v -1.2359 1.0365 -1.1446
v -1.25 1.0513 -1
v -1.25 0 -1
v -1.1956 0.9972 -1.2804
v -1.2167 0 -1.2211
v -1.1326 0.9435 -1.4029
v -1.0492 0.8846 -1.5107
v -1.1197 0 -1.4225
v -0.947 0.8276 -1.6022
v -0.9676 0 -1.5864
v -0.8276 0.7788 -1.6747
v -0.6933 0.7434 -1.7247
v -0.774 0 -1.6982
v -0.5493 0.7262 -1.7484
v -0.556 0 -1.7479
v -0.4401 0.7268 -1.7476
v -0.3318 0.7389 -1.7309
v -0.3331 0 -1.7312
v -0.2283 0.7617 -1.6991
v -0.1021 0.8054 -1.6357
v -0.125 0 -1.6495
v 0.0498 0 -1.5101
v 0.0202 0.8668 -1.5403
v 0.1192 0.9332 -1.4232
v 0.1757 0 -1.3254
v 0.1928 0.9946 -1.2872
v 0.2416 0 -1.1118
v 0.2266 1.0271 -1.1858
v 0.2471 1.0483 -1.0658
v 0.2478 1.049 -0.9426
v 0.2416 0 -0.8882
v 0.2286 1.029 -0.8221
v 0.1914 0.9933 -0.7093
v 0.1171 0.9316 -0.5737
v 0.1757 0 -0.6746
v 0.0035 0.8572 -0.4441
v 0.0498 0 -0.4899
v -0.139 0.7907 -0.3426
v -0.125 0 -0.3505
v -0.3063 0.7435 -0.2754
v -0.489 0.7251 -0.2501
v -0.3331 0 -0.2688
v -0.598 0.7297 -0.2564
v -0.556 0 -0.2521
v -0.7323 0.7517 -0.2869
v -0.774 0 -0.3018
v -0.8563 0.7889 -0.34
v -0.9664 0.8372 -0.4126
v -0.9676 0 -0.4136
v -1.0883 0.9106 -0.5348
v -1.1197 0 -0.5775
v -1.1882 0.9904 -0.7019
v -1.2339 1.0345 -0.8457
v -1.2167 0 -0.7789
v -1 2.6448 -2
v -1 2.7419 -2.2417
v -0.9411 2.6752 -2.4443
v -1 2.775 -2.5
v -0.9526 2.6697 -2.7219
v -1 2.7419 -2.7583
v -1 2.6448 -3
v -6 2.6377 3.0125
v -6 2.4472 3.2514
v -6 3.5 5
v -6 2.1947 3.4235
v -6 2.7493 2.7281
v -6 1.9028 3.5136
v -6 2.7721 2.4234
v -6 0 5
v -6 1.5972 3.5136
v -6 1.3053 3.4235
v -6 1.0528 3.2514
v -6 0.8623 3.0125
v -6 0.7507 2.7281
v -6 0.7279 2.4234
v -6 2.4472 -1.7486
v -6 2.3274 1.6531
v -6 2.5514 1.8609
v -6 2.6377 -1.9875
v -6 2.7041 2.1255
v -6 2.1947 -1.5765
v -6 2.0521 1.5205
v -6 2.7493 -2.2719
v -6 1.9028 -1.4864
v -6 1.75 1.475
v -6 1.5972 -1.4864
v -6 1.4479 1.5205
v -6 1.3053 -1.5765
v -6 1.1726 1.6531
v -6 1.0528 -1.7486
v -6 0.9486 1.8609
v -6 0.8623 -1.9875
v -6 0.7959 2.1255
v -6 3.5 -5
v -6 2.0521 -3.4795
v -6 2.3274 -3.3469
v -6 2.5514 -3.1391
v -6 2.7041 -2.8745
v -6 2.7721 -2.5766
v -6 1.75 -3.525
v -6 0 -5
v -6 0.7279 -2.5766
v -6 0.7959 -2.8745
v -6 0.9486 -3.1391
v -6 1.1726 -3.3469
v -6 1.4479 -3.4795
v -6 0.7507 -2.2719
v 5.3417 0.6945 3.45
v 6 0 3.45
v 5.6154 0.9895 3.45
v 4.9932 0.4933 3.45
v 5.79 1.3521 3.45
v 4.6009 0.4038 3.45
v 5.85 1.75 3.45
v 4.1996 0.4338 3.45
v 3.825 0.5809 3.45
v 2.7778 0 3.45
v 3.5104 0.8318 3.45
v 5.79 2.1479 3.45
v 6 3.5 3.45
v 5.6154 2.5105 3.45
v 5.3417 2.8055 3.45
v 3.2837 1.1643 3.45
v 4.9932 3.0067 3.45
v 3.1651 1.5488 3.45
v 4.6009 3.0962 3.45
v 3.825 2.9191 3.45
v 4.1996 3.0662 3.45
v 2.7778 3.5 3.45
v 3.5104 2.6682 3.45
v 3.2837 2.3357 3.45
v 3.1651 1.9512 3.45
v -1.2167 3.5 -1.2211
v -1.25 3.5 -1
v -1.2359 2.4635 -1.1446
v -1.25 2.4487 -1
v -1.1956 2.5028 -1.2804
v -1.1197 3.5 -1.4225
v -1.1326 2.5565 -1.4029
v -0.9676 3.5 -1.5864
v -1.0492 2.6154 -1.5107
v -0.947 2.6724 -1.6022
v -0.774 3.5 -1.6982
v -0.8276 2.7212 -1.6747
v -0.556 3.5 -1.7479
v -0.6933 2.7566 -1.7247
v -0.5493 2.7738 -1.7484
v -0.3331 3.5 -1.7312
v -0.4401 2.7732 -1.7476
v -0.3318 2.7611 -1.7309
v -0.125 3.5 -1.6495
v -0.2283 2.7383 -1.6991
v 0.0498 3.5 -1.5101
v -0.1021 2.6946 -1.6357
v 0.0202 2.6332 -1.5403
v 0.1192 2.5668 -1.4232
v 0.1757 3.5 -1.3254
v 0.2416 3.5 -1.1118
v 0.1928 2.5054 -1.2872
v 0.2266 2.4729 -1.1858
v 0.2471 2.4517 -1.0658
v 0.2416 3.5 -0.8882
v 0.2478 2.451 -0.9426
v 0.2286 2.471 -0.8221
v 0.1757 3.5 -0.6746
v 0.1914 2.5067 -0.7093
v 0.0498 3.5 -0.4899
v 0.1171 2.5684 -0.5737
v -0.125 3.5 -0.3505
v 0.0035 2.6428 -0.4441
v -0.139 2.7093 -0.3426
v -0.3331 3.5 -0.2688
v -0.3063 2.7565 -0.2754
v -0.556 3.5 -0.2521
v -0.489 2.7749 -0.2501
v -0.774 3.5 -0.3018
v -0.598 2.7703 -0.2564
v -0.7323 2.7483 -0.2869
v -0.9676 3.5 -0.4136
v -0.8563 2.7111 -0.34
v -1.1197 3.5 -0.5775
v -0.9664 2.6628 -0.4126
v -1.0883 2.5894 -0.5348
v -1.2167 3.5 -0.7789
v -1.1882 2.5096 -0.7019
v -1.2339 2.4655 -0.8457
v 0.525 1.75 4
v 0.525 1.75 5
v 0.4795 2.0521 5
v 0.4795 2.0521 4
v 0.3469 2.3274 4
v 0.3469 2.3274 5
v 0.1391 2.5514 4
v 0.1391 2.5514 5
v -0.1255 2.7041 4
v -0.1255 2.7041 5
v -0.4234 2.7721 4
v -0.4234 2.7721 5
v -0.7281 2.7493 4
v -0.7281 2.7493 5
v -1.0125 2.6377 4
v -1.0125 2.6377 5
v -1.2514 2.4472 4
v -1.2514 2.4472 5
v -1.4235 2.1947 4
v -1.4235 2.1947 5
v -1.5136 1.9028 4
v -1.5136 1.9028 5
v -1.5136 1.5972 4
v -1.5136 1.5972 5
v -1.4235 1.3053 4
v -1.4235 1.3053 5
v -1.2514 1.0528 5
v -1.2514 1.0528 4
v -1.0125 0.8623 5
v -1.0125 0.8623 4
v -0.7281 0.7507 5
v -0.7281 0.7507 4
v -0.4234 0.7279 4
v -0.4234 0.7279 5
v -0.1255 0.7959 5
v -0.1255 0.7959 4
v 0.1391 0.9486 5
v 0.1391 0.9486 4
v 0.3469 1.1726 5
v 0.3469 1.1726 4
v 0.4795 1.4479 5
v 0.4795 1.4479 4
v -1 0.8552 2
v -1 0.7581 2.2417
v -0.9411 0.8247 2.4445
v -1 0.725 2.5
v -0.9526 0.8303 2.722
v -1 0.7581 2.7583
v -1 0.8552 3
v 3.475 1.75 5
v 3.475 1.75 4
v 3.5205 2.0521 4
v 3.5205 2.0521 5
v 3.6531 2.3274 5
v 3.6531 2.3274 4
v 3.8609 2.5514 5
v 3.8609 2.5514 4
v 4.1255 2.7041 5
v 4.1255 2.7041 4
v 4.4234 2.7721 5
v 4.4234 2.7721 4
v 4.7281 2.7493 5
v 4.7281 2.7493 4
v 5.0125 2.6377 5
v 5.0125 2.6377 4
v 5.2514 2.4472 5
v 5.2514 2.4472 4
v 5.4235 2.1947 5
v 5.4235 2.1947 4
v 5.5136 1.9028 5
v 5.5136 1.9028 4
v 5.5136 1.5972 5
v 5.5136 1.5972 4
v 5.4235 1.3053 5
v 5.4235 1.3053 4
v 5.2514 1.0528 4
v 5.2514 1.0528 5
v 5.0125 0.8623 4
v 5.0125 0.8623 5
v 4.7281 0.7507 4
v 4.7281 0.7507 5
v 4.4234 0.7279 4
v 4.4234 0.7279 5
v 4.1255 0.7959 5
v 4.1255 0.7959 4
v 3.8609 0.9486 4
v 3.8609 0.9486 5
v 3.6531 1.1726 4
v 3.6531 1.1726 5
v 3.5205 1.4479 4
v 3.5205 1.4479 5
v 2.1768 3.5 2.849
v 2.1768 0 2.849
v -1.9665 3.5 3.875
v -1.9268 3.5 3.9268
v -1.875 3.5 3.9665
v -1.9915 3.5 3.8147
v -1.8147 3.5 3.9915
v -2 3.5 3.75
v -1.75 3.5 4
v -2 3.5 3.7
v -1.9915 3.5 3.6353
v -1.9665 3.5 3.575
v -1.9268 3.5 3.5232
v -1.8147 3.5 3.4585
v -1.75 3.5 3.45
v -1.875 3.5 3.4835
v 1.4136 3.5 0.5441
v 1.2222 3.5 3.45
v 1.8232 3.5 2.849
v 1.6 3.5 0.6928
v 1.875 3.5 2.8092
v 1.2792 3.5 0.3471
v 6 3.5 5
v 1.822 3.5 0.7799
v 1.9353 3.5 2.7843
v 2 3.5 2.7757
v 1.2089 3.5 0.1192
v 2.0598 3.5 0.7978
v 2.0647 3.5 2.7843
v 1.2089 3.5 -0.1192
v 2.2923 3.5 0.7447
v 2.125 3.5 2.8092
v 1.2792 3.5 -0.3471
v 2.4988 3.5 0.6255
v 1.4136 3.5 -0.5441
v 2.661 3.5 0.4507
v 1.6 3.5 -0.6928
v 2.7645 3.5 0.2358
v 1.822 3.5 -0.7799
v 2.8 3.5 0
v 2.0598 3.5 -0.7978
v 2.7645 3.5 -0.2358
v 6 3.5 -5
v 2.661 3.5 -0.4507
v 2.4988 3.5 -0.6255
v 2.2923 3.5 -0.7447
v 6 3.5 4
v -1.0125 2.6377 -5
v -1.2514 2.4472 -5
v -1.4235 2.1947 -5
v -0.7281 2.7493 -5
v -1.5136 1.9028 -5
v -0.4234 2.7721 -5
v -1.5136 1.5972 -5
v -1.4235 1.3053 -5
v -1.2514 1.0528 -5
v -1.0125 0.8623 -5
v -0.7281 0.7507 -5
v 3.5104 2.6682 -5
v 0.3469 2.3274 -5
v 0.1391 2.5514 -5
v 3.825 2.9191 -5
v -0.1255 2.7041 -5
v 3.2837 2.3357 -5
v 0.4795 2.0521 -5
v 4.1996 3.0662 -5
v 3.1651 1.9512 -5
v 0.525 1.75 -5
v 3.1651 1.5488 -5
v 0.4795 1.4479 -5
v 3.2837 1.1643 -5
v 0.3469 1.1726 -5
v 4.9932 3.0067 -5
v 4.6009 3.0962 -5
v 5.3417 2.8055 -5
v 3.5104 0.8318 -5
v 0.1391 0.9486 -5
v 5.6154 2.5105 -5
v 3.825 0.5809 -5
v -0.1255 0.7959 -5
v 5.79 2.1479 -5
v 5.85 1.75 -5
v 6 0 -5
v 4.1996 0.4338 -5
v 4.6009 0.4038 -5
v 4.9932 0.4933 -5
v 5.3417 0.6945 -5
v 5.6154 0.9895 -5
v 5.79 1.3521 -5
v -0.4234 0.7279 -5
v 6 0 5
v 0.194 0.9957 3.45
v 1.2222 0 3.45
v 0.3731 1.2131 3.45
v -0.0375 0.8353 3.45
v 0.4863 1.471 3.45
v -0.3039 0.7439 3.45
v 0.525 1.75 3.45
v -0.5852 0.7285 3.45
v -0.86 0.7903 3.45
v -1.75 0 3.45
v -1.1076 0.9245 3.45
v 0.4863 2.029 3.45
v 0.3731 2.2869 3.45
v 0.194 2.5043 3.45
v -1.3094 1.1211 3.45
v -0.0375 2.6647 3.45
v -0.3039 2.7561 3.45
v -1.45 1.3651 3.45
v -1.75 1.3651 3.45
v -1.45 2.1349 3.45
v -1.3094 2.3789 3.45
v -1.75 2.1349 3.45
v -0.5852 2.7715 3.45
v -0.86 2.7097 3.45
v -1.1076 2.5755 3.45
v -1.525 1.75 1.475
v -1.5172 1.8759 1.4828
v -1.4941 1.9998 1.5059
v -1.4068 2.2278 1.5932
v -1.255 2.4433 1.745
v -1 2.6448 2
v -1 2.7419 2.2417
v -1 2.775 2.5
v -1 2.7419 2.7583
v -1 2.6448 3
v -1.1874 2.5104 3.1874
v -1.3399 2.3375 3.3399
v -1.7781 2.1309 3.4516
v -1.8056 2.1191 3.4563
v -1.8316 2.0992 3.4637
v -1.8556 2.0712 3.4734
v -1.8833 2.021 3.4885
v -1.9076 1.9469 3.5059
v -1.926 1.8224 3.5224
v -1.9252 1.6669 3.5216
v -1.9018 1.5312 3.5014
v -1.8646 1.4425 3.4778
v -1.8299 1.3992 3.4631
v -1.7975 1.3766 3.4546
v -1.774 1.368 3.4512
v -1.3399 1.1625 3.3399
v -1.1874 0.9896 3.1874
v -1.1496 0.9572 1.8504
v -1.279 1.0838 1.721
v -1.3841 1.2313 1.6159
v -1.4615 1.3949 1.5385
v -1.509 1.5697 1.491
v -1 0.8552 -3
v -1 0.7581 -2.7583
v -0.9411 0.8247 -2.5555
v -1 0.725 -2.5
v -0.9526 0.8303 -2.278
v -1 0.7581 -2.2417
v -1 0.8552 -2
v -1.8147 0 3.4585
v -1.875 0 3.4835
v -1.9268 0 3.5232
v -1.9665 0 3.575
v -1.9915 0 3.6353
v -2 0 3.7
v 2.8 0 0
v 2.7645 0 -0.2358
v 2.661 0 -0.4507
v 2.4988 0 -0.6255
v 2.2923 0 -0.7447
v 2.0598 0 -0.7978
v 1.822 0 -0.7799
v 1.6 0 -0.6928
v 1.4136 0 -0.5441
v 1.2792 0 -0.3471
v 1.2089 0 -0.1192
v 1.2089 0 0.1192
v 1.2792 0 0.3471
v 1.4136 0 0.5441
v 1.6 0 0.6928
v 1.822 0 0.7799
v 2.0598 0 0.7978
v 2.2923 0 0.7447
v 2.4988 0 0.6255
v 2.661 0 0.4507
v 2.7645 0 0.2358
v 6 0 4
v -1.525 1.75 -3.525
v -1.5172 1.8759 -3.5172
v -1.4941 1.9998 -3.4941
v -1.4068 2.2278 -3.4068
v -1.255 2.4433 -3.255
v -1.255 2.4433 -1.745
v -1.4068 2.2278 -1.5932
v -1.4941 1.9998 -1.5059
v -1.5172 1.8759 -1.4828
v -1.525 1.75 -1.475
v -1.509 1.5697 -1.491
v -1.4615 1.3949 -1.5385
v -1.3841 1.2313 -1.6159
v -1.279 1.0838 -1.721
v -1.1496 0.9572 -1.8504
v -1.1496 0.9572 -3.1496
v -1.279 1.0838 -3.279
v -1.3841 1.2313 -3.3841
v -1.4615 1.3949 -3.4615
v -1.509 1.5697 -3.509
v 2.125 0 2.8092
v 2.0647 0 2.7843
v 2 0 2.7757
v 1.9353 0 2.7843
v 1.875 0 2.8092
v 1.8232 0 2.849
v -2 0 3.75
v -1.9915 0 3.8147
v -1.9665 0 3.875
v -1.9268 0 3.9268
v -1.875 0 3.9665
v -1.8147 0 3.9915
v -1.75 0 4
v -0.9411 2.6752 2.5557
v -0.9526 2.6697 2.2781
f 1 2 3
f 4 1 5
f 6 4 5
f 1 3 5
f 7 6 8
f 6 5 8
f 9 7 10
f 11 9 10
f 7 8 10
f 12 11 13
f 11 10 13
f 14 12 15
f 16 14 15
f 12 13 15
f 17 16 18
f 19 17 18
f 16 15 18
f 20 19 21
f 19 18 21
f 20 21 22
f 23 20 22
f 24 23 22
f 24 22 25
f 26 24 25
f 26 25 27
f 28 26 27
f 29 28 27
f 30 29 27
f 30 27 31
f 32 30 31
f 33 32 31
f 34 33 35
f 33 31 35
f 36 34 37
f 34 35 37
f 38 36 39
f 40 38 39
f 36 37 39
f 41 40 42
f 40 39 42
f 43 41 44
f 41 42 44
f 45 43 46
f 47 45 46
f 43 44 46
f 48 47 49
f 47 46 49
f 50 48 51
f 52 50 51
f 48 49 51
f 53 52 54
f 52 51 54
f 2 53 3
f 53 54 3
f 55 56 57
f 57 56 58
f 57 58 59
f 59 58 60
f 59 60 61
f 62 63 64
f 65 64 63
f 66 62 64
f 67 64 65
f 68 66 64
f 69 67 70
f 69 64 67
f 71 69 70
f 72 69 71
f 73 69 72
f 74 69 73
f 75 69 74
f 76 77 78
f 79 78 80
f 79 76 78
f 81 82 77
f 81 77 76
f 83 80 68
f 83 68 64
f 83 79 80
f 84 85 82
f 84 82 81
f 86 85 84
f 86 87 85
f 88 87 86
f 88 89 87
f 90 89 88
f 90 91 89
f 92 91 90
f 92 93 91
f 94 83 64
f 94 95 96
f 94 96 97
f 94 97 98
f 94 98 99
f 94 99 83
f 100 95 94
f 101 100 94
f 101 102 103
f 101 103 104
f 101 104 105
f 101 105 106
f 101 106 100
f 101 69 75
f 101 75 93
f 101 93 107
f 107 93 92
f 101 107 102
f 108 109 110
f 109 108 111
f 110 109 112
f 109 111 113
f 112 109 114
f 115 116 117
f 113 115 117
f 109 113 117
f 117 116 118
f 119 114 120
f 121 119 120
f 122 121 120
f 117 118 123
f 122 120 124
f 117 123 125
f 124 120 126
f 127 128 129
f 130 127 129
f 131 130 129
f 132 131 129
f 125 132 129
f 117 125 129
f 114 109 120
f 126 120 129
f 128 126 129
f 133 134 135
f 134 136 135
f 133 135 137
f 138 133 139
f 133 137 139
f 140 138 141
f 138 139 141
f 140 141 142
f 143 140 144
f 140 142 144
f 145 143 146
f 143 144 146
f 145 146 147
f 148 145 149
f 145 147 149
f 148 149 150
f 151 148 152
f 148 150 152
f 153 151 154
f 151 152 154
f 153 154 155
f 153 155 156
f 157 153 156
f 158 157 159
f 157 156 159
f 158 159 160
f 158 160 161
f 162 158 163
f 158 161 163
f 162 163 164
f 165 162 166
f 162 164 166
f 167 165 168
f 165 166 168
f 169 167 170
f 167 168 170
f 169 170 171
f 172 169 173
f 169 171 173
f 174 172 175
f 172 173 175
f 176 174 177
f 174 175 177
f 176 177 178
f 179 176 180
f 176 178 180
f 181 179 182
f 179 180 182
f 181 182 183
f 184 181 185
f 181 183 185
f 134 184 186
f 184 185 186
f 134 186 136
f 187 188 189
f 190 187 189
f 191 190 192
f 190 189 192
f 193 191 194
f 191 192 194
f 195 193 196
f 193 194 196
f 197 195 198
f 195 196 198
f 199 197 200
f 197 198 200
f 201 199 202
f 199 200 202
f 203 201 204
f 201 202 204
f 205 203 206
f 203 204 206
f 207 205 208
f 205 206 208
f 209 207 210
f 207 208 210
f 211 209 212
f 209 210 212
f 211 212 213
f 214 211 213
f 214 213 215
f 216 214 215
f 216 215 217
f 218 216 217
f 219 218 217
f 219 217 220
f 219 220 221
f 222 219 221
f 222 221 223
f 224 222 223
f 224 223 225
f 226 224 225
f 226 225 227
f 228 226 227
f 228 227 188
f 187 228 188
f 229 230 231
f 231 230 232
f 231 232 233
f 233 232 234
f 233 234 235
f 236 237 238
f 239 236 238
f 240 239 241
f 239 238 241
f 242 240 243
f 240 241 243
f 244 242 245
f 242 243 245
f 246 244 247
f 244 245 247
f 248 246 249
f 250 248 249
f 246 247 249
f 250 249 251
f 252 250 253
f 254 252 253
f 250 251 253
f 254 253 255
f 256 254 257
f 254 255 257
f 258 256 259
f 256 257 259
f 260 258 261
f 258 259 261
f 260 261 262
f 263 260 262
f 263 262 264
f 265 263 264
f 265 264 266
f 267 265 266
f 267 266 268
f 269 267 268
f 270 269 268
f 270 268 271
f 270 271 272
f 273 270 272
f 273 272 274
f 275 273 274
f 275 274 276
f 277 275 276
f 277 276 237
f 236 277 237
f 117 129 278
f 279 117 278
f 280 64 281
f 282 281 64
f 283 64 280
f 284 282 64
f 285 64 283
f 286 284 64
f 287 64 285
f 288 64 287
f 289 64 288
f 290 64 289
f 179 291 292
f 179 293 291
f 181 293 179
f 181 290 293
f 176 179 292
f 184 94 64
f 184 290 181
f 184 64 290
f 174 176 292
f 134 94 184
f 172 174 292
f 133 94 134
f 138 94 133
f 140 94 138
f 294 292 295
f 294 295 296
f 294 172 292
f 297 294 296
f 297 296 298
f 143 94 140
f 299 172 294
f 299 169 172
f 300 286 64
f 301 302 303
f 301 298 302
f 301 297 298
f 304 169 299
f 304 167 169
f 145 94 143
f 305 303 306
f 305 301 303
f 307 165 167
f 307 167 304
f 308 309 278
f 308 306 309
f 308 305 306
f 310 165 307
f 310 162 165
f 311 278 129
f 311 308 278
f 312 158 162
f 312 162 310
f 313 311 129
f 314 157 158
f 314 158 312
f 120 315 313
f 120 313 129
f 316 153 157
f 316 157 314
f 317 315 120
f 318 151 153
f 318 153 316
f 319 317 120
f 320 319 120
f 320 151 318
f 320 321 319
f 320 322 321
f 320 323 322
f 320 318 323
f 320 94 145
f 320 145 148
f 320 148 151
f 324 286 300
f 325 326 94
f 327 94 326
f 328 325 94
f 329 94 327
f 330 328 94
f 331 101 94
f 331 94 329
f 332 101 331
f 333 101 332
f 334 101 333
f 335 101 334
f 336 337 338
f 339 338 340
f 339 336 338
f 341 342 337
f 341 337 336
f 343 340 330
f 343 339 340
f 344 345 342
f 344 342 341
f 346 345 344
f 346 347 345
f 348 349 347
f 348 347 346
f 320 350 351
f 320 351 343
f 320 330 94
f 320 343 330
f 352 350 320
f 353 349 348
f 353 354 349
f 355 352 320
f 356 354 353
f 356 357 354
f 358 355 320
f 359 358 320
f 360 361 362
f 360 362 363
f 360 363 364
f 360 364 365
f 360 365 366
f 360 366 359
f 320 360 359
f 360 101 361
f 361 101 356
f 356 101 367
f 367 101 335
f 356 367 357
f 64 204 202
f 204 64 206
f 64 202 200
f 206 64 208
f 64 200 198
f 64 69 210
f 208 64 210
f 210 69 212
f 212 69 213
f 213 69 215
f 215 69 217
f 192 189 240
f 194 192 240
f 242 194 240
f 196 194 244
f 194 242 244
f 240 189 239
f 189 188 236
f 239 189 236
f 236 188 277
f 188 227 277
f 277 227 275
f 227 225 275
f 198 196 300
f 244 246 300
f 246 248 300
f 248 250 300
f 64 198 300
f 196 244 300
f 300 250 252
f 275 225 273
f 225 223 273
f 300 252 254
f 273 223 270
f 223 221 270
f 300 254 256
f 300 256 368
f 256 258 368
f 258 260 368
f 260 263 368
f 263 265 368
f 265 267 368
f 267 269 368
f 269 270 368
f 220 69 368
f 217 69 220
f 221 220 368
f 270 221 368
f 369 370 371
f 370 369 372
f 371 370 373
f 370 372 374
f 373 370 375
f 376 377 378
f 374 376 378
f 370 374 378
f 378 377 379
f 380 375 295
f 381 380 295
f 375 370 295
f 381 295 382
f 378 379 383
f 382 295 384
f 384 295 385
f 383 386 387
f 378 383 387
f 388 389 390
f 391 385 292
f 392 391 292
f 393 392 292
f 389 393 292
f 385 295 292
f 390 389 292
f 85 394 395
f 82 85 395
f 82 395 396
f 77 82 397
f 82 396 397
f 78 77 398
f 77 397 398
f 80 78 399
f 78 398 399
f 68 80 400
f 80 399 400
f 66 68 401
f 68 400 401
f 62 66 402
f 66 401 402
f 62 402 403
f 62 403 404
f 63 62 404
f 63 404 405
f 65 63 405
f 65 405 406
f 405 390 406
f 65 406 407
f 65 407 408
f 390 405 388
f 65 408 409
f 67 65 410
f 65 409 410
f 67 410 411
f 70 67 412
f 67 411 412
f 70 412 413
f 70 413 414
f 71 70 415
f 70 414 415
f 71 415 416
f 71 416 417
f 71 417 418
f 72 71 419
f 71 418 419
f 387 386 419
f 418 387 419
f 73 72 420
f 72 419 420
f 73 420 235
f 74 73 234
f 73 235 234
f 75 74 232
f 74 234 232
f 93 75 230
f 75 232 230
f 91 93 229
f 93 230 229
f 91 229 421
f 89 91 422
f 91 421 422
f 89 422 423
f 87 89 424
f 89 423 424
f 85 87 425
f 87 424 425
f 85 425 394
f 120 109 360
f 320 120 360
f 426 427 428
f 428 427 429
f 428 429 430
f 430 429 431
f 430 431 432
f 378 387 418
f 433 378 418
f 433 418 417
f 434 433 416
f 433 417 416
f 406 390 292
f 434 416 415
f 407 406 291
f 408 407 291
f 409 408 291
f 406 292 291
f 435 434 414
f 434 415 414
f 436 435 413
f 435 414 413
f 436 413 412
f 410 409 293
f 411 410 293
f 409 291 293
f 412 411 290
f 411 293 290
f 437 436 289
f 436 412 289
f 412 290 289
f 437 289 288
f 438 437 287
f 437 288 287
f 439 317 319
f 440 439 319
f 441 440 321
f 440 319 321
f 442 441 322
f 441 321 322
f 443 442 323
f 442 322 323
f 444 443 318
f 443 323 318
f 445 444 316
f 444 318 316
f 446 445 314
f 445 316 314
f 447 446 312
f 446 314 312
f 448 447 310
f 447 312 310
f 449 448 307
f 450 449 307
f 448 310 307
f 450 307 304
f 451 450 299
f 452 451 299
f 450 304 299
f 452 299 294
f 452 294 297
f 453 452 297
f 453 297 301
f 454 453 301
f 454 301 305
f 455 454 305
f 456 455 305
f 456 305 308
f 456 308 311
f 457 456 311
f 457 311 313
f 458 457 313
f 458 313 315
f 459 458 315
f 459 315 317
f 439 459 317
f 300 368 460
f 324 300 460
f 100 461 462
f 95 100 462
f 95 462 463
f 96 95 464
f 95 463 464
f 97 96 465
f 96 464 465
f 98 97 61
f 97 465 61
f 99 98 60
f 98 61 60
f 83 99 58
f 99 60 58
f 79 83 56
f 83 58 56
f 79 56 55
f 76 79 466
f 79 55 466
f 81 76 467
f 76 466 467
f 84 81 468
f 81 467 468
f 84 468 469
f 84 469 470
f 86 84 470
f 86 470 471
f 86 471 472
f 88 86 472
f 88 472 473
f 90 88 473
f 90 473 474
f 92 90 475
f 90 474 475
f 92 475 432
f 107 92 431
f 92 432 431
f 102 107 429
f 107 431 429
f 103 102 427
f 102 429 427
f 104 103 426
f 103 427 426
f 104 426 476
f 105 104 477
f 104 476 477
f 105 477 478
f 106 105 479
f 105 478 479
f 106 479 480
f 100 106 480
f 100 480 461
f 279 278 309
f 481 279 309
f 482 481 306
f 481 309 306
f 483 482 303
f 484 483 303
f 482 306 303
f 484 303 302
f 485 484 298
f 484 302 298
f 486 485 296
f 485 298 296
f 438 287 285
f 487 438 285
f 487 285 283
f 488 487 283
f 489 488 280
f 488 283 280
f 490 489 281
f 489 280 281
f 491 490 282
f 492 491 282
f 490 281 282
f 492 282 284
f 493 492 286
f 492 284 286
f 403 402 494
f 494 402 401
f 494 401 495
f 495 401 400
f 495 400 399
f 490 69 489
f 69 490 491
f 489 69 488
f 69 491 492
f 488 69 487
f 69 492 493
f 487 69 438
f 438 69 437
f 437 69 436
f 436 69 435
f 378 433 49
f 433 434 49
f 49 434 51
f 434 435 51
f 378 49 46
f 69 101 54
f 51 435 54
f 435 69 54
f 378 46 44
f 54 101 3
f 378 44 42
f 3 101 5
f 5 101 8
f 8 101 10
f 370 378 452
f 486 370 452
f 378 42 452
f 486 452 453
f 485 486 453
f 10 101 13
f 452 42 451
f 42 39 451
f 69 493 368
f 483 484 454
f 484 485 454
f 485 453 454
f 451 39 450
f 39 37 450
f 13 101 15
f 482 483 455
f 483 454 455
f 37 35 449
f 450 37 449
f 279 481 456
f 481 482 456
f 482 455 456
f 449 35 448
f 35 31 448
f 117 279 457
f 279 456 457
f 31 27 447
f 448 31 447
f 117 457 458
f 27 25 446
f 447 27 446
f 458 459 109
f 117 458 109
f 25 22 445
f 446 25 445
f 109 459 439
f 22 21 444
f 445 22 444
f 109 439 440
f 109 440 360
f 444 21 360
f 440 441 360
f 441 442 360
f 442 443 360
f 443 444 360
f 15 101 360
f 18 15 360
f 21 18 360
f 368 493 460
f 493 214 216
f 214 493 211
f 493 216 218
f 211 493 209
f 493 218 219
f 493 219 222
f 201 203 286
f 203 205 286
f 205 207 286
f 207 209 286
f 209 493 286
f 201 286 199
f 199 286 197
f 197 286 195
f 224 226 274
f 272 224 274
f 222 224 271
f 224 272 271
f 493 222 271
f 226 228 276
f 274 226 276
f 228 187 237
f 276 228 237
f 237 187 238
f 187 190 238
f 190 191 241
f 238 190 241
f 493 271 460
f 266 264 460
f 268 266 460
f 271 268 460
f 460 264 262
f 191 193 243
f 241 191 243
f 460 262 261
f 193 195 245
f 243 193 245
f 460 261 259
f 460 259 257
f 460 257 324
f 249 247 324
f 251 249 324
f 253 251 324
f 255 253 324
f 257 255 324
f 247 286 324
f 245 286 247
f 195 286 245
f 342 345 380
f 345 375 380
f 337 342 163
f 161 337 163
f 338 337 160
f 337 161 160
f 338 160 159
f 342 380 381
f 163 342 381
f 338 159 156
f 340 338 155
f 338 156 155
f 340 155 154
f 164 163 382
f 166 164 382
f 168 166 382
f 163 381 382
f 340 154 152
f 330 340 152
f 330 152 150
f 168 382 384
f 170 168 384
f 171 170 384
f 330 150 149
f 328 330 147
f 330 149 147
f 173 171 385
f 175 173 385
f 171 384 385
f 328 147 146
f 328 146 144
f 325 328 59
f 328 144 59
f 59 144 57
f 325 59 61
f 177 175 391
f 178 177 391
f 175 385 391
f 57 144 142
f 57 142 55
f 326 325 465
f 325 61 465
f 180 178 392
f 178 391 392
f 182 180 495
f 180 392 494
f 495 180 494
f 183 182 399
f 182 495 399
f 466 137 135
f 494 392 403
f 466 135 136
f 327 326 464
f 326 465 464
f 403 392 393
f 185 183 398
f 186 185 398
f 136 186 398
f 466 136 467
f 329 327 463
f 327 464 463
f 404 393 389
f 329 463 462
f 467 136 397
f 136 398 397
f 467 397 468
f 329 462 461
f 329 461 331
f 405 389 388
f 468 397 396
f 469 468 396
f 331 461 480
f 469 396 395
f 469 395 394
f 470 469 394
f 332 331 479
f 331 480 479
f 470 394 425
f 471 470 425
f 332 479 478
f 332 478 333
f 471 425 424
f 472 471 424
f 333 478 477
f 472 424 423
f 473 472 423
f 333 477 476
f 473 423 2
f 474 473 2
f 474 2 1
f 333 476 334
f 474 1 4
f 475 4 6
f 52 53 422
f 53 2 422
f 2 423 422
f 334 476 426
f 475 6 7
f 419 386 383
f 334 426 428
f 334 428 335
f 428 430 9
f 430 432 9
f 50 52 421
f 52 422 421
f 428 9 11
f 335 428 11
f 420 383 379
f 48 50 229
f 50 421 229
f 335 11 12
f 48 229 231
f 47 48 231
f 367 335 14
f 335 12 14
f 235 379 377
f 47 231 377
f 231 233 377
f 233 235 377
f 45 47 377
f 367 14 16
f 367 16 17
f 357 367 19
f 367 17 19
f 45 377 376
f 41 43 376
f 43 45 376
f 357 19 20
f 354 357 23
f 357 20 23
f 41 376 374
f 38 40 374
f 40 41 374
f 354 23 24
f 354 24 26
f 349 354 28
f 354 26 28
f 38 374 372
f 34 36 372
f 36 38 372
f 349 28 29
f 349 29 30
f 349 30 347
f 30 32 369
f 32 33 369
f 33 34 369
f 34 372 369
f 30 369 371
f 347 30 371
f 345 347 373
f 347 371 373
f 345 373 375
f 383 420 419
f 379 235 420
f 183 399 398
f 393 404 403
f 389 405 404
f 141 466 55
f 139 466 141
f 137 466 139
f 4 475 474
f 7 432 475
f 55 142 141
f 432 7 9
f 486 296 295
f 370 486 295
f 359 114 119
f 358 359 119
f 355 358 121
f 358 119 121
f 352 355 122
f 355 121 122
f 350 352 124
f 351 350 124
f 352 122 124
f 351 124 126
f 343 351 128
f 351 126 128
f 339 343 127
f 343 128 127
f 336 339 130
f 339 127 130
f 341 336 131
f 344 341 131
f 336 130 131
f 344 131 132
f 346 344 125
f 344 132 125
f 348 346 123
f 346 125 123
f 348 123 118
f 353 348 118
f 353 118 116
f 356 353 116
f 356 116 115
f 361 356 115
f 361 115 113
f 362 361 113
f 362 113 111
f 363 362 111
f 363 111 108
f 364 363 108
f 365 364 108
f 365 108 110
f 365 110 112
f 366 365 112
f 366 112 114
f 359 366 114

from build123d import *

# Parameters (mm, degrees)
SKETCH1_W                      = 12
SKETCH1_H                      = 10
BOSS_EXTRUDE1_DEPTH            = 3.5
CUT_EXTRUDE1_DEPTH             = 3.5
M2_5_CLEARANCE_HOLE1_D         = 2.7
M2_5_CLEARANCE_HOLE1_DEPTH     = 8.45
M2_5_TAPPED_HOLE1_D            = 2.05
M2_5_TAPPED_HOLE1_DEPTH        = 1
F_1_5_1_5_DIAMETER_HOLE1_D     = 1.5
F_1_5_1_5_DIAMETER_HOLE1_DEPTH = 3.5
M2_5_TAPPED_HOLE2_D            = 2.05
M2_5_TAPPED_HOLE4_D            = 2.05
M2_5_TAPPED_HOLE4_DEPTH        = 5
M2_5_TAPPED_HOLE4_TIP          = 0.615882135
M2_TAPPED_HOLE1_D              = 1.6


with BuildPart() as part:
    # Sketch1 → Boss-Extrude1 (new body)
    with BuildSketch(Plane(origin=(0, 0, 0), x_dir=(1, 0, 0), z_dir=(0, 1, 0))):
        Rectangle(SKETCH1_W, SKETCH1_H)
    extrude(amount=BOSS_EXTRUDE1_DEPTH)

    # Sketch2 → Cut-Extrude1 (cut)
    with BuildSketch(Plane(origin=(0, 3.5, 0), x_dir=(1, 0, 0), z_dir=(0, 1, 0))):
        with BuildLine():
            Line((2.777817459, -3.45), (2.176776695, -2.848959236))
            ThreePointArc((2.176776695, -2.848959236), (2, -2.775735931), (1.823223305, -2.848959236))
            Line((1.823223305, -2.848959236), (1.222182541, -3.45))
            Line((1.222182541, -3.45), (-1.75, -3.45))
            ThreePointArc((-1.75, -3.45), (-1.926776695, -3.523223305), (-2, -3.7))
            Line((-2, -3.7), (-2, -3.75))
            ThreePointArc((-2, -3.75), (-1.926776695, -3.926776695), (-1.75, -4))
            Line((-1.75, -4), (6, -4))
            Line((6, -4), (6, -3.45))
            Line((6, -3.45), (2.777817459, -3.45))
        make_face()
    extrude(amount=-CUT_EXTRUDE1_DEPTH, mode=Mode.SUBTRACT)

    # M2.5 Clearance Hole1
    with Locations(Plane(origin=(0, 0, -5), x_dir=(-1, 0, 0), z_dir=(0, 0, -1))):
        with Locations((-4.5, 1.75)):
            Hole(M2_5_CLEARANCE_HOLE1_D / 2, depth=M2_5_CLEARANCE_HOLE1_DEPTH)

    # M2.5 Tapped Hole1
    with Locations(Plane.XY.offset(5)):
        with Locations((4.5, 1.75)):
            Hole(M2_5_TAPPED_HOLE1_D / 2, depth=M2_5_TAPPED_HOLE1_DEPTH)

    # Ø1.5 (1.5) Diameter Hole1
    with Locations(Plane(origin=(0, 3.5, 0), x_dir=(1, 0, 0), z_dir=(0, 1, 0))):
        with Locations((-0.5, 1)):
            Hole(F_1_5_1_5_DIAMETER_HOLE1_D / 2, depth=F_1_5_1_5_DIAMETER_HOLE1_DEPTH)

    # M2.5 Tapped Hole2 (through all)
    with Locations(Plane(origin=(0, 0, -5), x_dir=(-1, 0, 0), z_dir=(0, 0, -1))):
        with Locations((0.5, 1.75)):
            Hole(M2_5_TAPPED_HOLE2_D / 2)

    # M2.5 Tapped Hole4
    with Locations(Plane.ZY.offset(6)):
        with Locations((-2.5, 1.75), (2.5, 1.75)):
            Hole(M2_5_TAPPED_HOLE4_D / 2, depth=M2_5_TAPPED_HOLE4_DEPTH)
            with Locations((0, 0, -(M2_5_TAPPED_HOLE4_DEPTH + M2_5_TAPPED_HOLE4_TIP / 2))):  # 118° drill point
                Cone(0, M2_5_TAPPED_HOLE4_D / 2, M2_5_TAPPED_HOLE4_TIP, mode=Mode.SUBTRACT)

    # M2 Tapped Hole1 (through all)
    with Locations(Plane(origin=(0, 0, 0), x_dir=(-1, 0, 0), z_dir=(0, -1, 0))):
        with Locations((-2, 0)):
            Hole(M2_TAPPED_HOLE1_D / 2)


solid = part.part
